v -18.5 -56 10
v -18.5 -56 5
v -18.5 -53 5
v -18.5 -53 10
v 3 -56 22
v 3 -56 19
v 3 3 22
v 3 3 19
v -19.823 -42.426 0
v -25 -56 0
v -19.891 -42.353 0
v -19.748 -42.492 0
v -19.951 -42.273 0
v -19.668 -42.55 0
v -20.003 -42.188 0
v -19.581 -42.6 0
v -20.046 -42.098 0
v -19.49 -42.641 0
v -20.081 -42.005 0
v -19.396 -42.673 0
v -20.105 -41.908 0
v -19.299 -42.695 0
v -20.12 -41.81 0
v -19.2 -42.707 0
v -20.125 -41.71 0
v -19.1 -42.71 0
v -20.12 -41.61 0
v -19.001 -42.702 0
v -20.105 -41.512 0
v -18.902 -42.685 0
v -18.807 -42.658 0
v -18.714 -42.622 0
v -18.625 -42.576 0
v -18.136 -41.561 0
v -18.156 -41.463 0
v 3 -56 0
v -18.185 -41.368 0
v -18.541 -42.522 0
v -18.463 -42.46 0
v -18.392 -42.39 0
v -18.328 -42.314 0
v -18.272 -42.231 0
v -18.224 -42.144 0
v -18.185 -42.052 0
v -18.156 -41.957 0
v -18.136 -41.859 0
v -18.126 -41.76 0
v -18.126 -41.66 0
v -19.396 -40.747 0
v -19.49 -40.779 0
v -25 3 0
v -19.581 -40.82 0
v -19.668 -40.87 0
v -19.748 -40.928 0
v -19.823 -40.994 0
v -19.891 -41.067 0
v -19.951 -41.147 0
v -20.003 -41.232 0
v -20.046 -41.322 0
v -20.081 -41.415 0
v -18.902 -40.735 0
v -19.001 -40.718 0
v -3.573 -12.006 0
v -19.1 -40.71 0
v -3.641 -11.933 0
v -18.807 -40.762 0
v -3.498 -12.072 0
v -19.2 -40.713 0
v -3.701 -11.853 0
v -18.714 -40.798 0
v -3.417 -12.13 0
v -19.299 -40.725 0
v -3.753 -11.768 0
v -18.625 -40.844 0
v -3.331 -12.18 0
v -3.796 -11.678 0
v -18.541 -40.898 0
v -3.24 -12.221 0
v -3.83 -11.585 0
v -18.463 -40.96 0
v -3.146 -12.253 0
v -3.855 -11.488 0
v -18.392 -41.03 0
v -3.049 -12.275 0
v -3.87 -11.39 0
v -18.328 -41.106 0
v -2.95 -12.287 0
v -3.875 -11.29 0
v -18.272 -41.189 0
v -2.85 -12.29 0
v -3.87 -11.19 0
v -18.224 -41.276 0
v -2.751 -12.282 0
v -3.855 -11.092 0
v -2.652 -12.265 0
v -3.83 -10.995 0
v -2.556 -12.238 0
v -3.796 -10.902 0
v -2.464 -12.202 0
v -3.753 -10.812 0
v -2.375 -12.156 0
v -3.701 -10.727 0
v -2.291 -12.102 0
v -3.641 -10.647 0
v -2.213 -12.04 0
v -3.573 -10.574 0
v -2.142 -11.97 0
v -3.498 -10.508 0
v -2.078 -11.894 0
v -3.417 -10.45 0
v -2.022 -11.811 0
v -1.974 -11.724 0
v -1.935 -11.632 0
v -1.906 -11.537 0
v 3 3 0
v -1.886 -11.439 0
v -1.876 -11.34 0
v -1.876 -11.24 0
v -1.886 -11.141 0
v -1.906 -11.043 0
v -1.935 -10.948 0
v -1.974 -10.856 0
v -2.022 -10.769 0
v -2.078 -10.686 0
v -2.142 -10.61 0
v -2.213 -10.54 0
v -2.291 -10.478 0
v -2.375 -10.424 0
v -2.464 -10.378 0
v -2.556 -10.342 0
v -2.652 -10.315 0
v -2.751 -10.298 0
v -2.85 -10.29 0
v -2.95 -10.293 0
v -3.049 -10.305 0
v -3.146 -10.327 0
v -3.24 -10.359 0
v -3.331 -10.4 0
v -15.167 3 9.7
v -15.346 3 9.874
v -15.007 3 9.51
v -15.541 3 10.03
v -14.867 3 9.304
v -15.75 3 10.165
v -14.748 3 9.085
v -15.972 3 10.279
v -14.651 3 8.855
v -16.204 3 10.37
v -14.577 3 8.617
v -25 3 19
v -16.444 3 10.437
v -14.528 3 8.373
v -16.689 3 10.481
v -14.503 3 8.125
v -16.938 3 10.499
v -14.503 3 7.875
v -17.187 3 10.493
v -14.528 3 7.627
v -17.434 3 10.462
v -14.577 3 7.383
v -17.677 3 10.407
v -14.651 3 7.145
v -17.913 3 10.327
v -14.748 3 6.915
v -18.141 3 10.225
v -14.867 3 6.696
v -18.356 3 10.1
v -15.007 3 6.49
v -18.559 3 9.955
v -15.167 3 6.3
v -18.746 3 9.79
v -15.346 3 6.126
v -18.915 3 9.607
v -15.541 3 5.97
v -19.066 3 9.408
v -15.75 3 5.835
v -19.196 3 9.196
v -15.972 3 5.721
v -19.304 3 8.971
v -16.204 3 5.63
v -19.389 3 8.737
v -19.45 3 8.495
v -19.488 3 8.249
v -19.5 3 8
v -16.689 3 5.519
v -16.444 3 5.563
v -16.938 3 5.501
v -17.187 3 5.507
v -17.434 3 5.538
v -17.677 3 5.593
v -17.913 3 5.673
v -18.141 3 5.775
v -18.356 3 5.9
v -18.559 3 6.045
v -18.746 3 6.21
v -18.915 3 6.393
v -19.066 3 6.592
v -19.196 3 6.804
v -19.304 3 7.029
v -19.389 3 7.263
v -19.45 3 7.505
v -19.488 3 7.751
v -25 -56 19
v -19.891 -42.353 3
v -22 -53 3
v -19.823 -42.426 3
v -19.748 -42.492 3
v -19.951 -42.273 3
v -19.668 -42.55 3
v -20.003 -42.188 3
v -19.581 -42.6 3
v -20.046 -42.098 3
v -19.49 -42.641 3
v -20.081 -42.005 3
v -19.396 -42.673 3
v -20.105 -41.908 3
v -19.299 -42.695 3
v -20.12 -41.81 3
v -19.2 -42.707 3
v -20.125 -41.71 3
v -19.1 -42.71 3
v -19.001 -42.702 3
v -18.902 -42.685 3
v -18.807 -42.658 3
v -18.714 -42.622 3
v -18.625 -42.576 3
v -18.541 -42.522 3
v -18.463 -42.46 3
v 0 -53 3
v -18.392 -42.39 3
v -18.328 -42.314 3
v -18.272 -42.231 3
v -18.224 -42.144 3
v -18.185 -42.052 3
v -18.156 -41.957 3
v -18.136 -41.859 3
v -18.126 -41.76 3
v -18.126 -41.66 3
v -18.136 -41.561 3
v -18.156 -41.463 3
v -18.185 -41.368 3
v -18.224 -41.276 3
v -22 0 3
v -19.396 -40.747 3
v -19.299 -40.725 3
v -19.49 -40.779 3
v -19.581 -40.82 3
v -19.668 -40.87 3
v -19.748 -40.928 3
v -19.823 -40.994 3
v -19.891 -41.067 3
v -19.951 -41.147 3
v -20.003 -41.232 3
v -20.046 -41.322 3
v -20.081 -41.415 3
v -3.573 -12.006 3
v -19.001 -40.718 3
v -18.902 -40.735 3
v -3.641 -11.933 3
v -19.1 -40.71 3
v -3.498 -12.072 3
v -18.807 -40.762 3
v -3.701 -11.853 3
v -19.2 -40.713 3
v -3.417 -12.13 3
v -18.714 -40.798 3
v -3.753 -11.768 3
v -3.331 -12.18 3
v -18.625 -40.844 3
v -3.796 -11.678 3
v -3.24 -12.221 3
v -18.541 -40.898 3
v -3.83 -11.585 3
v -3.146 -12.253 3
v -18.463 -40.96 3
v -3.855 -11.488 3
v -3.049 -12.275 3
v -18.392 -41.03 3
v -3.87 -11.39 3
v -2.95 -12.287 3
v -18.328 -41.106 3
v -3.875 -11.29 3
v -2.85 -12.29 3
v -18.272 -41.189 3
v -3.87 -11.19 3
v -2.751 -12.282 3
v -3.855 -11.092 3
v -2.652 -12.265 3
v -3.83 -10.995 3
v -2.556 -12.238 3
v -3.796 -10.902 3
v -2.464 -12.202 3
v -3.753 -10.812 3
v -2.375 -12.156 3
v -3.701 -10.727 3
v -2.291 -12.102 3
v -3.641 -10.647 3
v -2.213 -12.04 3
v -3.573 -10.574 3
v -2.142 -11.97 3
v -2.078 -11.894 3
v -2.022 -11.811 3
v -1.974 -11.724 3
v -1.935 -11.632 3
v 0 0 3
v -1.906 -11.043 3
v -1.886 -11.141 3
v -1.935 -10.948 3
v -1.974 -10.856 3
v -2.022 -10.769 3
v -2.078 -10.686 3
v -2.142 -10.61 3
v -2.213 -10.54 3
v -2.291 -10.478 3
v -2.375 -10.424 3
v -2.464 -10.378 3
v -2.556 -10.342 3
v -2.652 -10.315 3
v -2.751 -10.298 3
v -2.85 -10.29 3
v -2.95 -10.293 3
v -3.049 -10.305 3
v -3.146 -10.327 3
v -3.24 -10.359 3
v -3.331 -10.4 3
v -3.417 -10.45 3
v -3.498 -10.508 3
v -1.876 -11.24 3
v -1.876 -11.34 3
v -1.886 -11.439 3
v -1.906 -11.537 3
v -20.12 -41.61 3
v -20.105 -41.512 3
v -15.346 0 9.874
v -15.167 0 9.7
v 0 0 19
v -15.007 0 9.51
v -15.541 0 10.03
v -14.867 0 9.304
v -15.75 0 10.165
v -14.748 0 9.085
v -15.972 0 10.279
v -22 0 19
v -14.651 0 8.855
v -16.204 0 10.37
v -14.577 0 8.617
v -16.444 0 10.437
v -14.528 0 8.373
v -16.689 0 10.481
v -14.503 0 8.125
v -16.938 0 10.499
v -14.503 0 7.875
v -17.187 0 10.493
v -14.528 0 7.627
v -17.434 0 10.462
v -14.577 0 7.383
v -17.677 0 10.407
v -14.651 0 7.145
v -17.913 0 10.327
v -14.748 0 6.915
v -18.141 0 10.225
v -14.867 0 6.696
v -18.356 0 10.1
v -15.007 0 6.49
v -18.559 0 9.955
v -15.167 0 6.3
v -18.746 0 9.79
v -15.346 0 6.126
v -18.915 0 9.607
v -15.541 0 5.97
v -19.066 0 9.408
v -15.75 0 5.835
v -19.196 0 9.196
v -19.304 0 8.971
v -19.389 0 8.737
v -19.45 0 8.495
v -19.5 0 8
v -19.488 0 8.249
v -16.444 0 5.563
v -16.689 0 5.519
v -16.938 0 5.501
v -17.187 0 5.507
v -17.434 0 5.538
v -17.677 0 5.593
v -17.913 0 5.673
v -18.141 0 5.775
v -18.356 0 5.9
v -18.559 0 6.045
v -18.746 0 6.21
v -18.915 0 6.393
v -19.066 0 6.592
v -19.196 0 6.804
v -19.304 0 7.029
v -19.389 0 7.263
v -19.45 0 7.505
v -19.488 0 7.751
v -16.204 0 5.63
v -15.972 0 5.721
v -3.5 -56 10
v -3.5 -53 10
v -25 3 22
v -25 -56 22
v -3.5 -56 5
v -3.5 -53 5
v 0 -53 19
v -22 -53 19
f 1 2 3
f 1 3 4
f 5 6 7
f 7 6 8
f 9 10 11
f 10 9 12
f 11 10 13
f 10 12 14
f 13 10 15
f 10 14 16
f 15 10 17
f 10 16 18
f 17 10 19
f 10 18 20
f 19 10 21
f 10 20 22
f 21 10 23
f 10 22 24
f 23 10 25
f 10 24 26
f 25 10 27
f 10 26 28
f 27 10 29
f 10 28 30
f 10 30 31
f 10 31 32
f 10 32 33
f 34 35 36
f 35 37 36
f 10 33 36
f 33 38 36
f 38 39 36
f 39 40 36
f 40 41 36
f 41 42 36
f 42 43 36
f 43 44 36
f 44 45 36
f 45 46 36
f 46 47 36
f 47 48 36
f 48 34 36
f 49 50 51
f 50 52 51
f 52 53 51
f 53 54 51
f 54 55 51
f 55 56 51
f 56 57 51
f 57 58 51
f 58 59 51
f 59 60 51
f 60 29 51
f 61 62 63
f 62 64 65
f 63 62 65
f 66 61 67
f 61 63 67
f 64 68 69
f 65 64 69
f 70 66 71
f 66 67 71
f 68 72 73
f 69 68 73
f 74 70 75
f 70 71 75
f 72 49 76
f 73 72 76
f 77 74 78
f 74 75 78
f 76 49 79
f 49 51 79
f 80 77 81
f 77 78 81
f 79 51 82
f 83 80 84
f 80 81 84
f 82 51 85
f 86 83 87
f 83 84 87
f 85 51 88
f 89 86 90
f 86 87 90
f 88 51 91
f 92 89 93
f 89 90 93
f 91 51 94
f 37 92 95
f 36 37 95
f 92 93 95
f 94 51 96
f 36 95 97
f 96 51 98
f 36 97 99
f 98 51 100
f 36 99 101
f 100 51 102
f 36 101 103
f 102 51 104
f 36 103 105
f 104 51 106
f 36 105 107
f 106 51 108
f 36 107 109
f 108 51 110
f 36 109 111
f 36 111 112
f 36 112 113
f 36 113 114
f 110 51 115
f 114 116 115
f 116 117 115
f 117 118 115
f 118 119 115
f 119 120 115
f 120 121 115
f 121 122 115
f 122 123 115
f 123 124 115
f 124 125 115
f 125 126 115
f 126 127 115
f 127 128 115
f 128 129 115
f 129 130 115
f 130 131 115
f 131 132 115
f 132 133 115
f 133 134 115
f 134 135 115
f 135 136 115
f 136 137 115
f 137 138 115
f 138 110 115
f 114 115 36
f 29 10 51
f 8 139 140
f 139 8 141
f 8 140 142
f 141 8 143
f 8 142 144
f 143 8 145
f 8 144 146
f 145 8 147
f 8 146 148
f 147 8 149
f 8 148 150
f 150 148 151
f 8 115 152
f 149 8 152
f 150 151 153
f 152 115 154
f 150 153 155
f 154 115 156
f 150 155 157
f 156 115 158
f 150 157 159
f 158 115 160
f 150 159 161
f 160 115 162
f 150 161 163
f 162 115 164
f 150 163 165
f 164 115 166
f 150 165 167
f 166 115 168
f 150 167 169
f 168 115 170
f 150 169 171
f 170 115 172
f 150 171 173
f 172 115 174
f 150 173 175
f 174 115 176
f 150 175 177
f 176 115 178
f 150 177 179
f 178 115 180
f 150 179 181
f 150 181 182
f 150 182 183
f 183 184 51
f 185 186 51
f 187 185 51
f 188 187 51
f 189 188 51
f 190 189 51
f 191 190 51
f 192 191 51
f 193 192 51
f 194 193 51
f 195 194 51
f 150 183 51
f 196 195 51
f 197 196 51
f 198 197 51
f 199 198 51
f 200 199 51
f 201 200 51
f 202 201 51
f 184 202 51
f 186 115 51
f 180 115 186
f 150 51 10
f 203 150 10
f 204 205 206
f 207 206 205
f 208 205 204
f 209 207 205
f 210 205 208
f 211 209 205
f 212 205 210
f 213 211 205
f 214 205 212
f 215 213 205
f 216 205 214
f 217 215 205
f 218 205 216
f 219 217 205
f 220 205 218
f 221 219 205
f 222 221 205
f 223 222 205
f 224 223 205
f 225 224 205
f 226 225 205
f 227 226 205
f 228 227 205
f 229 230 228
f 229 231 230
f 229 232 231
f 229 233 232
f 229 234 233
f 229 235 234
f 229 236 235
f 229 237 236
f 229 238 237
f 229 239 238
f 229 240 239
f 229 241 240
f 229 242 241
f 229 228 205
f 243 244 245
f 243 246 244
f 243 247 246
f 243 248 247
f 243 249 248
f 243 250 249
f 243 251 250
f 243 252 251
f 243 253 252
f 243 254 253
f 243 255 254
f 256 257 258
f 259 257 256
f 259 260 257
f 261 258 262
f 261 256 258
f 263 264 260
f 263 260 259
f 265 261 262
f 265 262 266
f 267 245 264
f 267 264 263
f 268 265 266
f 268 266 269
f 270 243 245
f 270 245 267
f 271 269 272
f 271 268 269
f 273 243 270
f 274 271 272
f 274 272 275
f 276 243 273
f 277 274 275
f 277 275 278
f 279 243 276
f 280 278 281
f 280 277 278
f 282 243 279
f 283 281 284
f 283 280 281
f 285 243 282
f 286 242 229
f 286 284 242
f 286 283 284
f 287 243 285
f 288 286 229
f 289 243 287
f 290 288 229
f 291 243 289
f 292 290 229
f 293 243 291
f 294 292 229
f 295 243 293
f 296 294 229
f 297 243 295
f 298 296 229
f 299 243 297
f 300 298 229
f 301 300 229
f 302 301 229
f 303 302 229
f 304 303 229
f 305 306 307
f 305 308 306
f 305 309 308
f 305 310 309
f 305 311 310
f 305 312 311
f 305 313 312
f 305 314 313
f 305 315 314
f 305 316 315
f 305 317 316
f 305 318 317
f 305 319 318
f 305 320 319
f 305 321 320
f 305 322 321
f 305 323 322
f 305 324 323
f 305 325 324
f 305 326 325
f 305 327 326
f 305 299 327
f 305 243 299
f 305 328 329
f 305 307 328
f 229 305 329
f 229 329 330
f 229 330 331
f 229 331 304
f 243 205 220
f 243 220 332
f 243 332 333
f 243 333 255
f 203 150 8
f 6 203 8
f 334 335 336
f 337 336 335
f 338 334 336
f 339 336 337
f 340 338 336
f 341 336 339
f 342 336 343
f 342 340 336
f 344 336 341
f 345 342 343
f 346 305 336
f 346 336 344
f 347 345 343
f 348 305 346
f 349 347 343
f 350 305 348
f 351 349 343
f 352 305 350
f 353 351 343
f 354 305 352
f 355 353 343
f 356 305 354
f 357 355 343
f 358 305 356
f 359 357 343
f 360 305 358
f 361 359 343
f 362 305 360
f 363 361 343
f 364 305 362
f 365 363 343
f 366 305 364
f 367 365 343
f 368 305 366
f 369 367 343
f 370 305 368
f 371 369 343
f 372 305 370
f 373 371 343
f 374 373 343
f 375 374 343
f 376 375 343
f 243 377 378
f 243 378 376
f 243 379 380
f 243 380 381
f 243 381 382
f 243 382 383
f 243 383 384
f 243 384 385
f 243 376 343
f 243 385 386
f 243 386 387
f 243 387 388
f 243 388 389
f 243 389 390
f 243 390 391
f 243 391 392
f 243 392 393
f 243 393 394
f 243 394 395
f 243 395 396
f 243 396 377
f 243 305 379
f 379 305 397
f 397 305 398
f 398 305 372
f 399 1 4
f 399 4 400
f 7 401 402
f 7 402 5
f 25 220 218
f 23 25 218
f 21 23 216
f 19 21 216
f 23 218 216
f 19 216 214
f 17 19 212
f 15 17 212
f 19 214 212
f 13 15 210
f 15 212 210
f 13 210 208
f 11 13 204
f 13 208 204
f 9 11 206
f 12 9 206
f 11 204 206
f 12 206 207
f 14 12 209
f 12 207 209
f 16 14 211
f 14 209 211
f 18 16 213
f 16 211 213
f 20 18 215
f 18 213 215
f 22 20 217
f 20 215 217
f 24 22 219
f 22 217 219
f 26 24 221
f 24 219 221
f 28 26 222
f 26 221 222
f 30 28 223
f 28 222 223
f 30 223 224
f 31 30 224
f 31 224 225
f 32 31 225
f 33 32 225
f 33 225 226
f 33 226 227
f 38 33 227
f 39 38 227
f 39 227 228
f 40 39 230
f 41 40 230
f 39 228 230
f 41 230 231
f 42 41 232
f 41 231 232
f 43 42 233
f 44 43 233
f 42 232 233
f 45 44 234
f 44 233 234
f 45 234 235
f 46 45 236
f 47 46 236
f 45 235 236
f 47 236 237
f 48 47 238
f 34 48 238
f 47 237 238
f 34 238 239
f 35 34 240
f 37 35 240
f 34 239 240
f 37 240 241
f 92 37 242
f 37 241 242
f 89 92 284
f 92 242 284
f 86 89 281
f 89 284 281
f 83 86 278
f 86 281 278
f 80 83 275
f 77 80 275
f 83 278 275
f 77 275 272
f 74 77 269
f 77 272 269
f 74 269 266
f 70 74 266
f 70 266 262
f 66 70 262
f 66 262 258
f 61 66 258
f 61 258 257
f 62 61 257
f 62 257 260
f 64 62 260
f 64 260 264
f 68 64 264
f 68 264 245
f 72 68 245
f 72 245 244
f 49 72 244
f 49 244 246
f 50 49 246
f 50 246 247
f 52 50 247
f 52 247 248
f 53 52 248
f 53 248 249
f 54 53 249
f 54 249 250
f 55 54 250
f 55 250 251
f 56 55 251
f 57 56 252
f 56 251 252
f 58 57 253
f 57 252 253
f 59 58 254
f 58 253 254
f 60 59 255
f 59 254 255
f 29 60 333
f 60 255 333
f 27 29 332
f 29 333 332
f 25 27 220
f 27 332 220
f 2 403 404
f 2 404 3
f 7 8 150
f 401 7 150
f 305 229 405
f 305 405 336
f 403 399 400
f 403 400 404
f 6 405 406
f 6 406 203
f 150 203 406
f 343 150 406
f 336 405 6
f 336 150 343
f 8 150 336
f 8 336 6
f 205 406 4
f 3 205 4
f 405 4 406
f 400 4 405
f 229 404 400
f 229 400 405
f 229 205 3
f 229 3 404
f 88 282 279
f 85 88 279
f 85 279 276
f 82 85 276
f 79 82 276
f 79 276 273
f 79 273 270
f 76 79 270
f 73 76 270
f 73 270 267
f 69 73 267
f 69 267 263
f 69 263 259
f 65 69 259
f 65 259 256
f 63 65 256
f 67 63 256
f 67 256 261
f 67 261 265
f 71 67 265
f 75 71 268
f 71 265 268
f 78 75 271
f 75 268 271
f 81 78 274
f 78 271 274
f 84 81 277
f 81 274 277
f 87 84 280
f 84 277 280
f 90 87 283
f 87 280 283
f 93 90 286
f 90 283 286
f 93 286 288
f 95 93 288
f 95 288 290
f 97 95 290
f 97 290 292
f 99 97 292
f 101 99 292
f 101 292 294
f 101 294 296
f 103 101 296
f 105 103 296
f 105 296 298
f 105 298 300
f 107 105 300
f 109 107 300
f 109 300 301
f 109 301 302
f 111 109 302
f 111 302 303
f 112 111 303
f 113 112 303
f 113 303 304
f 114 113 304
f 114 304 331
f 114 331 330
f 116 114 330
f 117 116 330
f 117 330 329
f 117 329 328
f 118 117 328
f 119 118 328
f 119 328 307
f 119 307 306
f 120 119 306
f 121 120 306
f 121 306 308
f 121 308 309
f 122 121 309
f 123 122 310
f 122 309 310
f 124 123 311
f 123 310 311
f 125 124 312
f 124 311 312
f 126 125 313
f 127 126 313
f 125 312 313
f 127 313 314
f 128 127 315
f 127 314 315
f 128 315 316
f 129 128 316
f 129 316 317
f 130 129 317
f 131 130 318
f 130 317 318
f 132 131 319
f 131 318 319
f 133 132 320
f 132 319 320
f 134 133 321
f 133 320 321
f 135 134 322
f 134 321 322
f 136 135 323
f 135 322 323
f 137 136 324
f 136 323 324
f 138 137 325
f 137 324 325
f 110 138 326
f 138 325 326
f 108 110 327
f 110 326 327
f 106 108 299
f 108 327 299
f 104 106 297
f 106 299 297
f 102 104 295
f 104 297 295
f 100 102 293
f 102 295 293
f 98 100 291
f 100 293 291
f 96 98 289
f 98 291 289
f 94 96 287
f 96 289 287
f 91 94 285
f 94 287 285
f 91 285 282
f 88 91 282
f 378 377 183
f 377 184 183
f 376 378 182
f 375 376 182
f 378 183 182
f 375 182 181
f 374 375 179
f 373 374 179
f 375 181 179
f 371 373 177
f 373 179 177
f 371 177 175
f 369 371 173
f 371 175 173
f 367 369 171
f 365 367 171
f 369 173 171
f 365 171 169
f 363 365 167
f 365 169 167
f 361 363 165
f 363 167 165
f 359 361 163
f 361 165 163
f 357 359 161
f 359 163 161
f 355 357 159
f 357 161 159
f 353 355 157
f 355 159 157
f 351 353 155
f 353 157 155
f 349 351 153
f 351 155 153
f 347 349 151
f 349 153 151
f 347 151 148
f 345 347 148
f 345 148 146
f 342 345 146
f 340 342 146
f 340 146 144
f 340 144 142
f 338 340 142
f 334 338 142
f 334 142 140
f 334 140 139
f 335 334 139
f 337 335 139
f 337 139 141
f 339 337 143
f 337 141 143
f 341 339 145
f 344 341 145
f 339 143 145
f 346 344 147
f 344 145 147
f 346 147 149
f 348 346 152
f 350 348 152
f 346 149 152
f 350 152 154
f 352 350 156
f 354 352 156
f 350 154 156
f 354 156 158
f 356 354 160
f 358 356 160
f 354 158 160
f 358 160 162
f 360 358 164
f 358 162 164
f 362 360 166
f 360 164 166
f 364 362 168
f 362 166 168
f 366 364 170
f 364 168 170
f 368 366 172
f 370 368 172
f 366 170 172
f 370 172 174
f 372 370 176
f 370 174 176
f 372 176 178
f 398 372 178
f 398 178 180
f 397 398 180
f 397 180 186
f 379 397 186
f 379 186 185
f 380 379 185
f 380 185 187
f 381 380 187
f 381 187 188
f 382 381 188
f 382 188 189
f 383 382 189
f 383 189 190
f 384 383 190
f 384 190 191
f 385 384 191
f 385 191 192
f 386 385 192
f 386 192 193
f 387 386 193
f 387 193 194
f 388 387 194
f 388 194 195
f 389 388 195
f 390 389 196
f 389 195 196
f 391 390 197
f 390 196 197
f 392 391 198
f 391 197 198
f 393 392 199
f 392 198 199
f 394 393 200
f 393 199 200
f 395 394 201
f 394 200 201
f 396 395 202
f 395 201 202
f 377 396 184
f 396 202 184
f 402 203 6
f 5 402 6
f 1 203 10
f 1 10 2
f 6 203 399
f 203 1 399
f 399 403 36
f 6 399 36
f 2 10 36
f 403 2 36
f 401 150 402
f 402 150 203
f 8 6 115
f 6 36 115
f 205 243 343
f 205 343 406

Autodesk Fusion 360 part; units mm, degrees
sketch "Skizze1" plane through (0, 0, 0) normal (0, 0, 1) x (1, 0, 0) in component "light-on-checker"
  line L0 (0, 0) -> (-22, 0)
  line L1 (-22, 0) -> (-22, -53)
  line L2 (-22, -53) -> (0, -53)
  line L3 (0, -53) -> (0, 0)
  line L4 (3, -56) -> (3, 3)
  line L5 (3, 3) -> (-25, 3)
  line L6 (-25, 3) -> (-25, -56)
  line L7 (-25, -56) -> (3, -56)
  dimension "d11" = 22
  dimension "d12" = 53
  dimension "d13" = 3
extrude "Extrusion1" add sketch "Skizze1" along normal blind 3 contours L0 L1 L2 L3 makes body 1 in component "light-on-checker"
extrude "Extrusion2" add sketch "Skizze1" along normal blind 19 bodies 1 in component "light-on-checker"
extrude "Extrusion3" add sketch "Skizze1" along normal blind 3 from surface at 19 separate body contours L0 L1 L2 L3 | L4 L5 L6 L7 makes body 2 in component "light-on-checker"
sketch "Skizze2" plane through (0, 0, 3) normal (0, 0, 1) x (-1, 0, 0) in component "light-on-checker"
  line L0 (0, 53) -> (0, 0)
  line L1 (0, 0) -> (22, 0)
  line L2 (22, 0) -> (22, 53)
  line L3 (22, 53) -> (0, 53)
  line L4 (0, 0) -> (22, 53) construction
  line L5 (21.595, 4.91) -> (0.405, 4.91) construction
  line L6 (0.405, 4.91) -> (0.405, 48.09) construction
  line L7 (0.405, 48.09) -> (21.595, 48.09) construction
  line L8 (21.595, 48.09) -> (21.595, 4.91) construction
  line L9 (21.595, 4.91) -> (0.405, 48.09) construction
  line L10 (0.405, 4.91) -> (21.595, 48.09) construction
  line L11 (19.125, 48.09) -> (19.125, 4.91) construction
  line L12 (2.8749, 48.09) -> (2.8749, 4.8867) construction
  line L13 (19.125, 11.29) -> (2.8749, 11.29) construction
  line L14 (2.8749, 41.71) -> (19.125, 41.71) construction
  circle A0 centre (19.125, 41.71) radius 1
  circle A1 centre (2.8749, 11.29) radius 1
  point P0 (11, 26.5)
  dimension "d21" = 21.19
  dimension "d22" = 43.18
  dimension "d23" = 2.47
  dimension "d24" = 2.47
  dimension "d25" = 6.38
  dimension "d26" = 6.38
  dimension "d27" = 2
  dimension "d28" = 2
extrude "Extrusion4" cut sketch "Skizze2" against normal blind 7 contours A0 | A1 bodies 1 in component "light-on-checker"
sketch "Skizze3" plane through (0, 3, 0) normal (0, 1, 0) x (-1, 0, 0) in component "light-on-checker"
  line L0 (-3, 0) -> (25, 0)
  line L1 (25, 0) -> (25, 19)
  line L2 (25, 19) -> (-3, 19)
  line L3 (-3, 19) -> (-3, 0)
  circle A0 centre (17, 8) radius 2.5
  dimension "d31" = 5
  dimension "d32" = 8
  dimension "d33" = 8
extrude "Extrusion5" cut sketch "Skizze3" against normal blind 8 contours A0 bodies 1 in component "light-on-checker"
sketch "Skizze4" plane through (0, -56, 0) normal (0, -1, 0) x (1, 0, 0) in component "light-on-checker"
  line L0 (-25, 0) -> (3, 0)
  line L1 (3, 0) -> (3, 19)
  line L2 (3, 19) -> (-25, 19)
  line L3 (-25, 19) -> (-25, 0)
  line L4 (-18.5, 10) -> (-3.5, 10)
  line L5 (-3.5, 10) -> (-3.5, 5)
  line L6 (-3.5, 5) -> (-18.5, 5)
  line L7 (-18.5, 5) -> (-18.5, 10)
  line L8 (-25, 5) -> (3, 5) construction
  dimension "d36" = 15
  dimension "d37" = 5
  dimension "d38" = 5
extrude "Extrusion6" cut sketch "Skizze4" against normal blind 9 contours L4 L5 L6 L7 bodies 1 in component "light-on-checker"
component "light-on-checker" placed x (1, 0, 0) y (0, 1, 0) z (0, 0, 1) at (0, 0, 0)
equation "d16 = 3.00 mm + 16 mm"
equation "d114 = 2 mm + 25.4 mm"
